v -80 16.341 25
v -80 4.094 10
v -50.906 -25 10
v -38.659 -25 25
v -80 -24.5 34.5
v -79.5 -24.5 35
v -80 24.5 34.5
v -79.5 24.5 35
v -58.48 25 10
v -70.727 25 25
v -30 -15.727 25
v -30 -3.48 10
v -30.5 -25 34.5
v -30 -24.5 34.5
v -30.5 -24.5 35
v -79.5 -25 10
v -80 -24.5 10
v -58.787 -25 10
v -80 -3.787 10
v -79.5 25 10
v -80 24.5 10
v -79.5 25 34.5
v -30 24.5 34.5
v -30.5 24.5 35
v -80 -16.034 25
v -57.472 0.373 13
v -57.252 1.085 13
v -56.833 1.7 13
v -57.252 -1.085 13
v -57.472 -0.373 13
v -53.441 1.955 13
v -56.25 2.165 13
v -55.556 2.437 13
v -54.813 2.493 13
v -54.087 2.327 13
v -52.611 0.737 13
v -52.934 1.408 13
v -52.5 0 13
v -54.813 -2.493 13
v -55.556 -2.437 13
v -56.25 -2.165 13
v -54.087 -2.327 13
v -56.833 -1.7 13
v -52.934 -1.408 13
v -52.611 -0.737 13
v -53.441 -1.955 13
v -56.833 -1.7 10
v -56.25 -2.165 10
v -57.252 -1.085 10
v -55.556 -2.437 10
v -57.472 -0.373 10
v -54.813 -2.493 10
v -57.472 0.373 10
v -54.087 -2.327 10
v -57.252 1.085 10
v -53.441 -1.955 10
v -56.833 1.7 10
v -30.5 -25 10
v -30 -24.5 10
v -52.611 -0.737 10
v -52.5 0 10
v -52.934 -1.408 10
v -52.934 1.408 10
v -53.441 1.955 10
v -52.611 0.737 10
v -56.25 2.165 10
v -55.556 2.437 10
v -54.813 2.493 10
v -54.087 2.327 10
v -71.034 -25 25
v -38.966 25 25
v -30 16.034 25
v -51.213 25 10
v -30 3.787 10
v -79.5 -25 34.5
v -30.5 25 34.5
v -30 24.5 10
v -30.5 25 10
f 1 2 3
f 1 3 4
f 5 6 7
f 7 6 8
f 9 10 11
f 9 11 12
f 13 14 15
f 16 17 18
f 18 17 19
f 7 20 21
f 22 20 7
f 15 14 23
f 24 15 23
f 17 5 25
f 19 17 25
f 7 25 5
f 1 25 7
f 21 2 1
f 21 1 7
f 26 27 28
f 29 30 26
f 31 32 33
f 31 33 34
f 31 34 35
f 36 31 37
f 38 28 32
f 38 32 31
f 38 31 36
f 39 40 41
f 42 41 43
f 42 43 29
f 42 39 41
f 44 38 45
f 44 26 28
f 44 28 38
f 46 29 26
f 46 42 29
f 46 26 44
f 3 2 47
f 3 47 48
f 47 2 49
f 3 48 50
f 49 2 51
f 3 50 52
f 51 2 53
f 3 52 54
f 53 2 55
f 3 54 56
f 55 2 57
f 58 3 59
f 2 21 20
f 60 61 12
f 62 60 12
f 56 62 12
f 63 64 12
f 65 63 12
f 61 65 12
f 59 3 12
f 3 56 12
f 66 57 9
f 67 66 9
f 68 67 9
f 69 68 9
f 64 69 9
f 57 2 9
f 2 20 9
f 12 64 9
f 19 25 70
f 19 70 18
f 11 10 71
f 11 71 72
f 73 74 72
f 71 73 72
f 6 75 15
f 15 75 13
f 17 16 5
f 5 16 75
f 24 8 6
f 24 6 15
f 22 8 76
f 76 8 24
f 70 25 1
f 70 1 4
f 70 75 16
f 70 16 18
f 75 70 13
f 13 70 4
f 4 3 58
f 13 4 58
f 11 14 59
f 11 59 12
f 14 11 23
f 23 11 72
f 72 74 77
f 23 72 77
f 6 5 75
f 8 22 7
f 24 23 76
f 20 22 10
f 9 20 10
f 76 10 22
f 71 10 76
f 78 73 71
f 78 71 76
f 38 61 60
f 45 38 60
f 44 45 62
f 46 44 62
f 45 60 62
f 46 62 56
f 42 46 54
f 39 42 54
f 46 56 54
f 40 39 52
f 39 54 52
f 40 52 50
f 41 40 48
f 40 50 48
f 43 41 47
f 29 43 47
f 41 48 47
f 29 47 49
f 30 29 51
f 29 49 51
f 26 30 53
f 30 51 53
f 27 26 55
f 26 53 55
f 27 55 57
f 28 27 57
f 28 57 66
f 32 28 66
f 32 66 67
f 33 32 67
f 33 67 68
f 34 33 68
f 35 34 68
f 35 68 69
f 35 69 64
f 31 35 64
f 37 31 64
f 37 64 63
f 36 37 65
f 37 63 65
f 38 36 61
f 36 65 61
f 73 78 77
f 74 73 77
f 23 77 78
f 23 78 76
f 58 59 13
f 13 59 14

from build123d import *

# Parameters (mm, degrees)
F0_W      = 50
F0_H      = 50
F1_DEPTH  = 25
F4_DEPTH  = 70.7116781187
F5_W      = 50
F5_H      = 50
F6_DEPTH  = 25
F9_SIZE   = 0.5
F11_R     = 2.5
F12_DEPTH = 3


with BuildPart() as f1:
    # F0 (on Top) → F1 (new body)
    with BuildSketch(Plane.XY):
        Rectangle(F0_W, F0_H)
    extrude(amount=F1_DEPTH)

    # F3 (on face) → F4 (cut, through all)
    with BuildSketch(Plane(origin=(25, -25, 0), x_dir=(-0.7071067812, -0.7071067812, 0), z_dir=(-0.7071067812, 0.7071067812, 0))):
        Polygon((35.3553390593, 25), (29.0155930972, 25), (20.3553390593, 10), (35.3553390593, 10), align=None)
        Polygon((-20.3553390593, 10), (-29.0155930972, 25), (-35.3553390593, 25), (-35.3553390593, 10), align=None)
        Polygon((6.1227716358, 25), (0, 25), (-6.5567202885, 25), (-15.2169743263, 10), (14.7830256737, 10), align=None)
    extrude(amount=F4_DEPTH, mode=Mode.SUBTRACT)


with BuildPart() as f6:
    # F5 (on face) → F6 (new body)
    with BuildSketch(Plane.XY.offset(10)):
        Rectangle(F5_W, F5_H)
    extrude(amount=F6_DEPTH)

    # F7: cut F1
    add(f1.part, mode=Mode.SUBTRACT)


with BuildPart() as f6_1:
    # F8: moved
    add(f6.part.moved(Location((-55, 0, 0))))

    # F9
    f9_edges = [f6_1.edges().sort_by_distance(p)[0] for p in [
        (-80, 25, 22.5),
        (-80, -25, 22.5),
        (-30, 25, 22.5),
        (-30, -25, 22.5),
        (-30, 0, 35),
        (-55, 25, 35),
        (-80, 0, 35),
        (-55, -25, 35),
    ]]
    chamfer(f9_edges, length=F9_SIZE)

    # F11 (on face) → F12 (cut)
    with BuildSketch(Plane(origin=(0, 0, 10), x_dir=(1, 0, 0), z_dir=(0, 0, -1))):
        with Locations((-55, 0)):
            Circle(F11_R)
    extrude(amount=-F12_DEPTH, mode=Mode.SUBTRACT)


solid = f6_1.part
